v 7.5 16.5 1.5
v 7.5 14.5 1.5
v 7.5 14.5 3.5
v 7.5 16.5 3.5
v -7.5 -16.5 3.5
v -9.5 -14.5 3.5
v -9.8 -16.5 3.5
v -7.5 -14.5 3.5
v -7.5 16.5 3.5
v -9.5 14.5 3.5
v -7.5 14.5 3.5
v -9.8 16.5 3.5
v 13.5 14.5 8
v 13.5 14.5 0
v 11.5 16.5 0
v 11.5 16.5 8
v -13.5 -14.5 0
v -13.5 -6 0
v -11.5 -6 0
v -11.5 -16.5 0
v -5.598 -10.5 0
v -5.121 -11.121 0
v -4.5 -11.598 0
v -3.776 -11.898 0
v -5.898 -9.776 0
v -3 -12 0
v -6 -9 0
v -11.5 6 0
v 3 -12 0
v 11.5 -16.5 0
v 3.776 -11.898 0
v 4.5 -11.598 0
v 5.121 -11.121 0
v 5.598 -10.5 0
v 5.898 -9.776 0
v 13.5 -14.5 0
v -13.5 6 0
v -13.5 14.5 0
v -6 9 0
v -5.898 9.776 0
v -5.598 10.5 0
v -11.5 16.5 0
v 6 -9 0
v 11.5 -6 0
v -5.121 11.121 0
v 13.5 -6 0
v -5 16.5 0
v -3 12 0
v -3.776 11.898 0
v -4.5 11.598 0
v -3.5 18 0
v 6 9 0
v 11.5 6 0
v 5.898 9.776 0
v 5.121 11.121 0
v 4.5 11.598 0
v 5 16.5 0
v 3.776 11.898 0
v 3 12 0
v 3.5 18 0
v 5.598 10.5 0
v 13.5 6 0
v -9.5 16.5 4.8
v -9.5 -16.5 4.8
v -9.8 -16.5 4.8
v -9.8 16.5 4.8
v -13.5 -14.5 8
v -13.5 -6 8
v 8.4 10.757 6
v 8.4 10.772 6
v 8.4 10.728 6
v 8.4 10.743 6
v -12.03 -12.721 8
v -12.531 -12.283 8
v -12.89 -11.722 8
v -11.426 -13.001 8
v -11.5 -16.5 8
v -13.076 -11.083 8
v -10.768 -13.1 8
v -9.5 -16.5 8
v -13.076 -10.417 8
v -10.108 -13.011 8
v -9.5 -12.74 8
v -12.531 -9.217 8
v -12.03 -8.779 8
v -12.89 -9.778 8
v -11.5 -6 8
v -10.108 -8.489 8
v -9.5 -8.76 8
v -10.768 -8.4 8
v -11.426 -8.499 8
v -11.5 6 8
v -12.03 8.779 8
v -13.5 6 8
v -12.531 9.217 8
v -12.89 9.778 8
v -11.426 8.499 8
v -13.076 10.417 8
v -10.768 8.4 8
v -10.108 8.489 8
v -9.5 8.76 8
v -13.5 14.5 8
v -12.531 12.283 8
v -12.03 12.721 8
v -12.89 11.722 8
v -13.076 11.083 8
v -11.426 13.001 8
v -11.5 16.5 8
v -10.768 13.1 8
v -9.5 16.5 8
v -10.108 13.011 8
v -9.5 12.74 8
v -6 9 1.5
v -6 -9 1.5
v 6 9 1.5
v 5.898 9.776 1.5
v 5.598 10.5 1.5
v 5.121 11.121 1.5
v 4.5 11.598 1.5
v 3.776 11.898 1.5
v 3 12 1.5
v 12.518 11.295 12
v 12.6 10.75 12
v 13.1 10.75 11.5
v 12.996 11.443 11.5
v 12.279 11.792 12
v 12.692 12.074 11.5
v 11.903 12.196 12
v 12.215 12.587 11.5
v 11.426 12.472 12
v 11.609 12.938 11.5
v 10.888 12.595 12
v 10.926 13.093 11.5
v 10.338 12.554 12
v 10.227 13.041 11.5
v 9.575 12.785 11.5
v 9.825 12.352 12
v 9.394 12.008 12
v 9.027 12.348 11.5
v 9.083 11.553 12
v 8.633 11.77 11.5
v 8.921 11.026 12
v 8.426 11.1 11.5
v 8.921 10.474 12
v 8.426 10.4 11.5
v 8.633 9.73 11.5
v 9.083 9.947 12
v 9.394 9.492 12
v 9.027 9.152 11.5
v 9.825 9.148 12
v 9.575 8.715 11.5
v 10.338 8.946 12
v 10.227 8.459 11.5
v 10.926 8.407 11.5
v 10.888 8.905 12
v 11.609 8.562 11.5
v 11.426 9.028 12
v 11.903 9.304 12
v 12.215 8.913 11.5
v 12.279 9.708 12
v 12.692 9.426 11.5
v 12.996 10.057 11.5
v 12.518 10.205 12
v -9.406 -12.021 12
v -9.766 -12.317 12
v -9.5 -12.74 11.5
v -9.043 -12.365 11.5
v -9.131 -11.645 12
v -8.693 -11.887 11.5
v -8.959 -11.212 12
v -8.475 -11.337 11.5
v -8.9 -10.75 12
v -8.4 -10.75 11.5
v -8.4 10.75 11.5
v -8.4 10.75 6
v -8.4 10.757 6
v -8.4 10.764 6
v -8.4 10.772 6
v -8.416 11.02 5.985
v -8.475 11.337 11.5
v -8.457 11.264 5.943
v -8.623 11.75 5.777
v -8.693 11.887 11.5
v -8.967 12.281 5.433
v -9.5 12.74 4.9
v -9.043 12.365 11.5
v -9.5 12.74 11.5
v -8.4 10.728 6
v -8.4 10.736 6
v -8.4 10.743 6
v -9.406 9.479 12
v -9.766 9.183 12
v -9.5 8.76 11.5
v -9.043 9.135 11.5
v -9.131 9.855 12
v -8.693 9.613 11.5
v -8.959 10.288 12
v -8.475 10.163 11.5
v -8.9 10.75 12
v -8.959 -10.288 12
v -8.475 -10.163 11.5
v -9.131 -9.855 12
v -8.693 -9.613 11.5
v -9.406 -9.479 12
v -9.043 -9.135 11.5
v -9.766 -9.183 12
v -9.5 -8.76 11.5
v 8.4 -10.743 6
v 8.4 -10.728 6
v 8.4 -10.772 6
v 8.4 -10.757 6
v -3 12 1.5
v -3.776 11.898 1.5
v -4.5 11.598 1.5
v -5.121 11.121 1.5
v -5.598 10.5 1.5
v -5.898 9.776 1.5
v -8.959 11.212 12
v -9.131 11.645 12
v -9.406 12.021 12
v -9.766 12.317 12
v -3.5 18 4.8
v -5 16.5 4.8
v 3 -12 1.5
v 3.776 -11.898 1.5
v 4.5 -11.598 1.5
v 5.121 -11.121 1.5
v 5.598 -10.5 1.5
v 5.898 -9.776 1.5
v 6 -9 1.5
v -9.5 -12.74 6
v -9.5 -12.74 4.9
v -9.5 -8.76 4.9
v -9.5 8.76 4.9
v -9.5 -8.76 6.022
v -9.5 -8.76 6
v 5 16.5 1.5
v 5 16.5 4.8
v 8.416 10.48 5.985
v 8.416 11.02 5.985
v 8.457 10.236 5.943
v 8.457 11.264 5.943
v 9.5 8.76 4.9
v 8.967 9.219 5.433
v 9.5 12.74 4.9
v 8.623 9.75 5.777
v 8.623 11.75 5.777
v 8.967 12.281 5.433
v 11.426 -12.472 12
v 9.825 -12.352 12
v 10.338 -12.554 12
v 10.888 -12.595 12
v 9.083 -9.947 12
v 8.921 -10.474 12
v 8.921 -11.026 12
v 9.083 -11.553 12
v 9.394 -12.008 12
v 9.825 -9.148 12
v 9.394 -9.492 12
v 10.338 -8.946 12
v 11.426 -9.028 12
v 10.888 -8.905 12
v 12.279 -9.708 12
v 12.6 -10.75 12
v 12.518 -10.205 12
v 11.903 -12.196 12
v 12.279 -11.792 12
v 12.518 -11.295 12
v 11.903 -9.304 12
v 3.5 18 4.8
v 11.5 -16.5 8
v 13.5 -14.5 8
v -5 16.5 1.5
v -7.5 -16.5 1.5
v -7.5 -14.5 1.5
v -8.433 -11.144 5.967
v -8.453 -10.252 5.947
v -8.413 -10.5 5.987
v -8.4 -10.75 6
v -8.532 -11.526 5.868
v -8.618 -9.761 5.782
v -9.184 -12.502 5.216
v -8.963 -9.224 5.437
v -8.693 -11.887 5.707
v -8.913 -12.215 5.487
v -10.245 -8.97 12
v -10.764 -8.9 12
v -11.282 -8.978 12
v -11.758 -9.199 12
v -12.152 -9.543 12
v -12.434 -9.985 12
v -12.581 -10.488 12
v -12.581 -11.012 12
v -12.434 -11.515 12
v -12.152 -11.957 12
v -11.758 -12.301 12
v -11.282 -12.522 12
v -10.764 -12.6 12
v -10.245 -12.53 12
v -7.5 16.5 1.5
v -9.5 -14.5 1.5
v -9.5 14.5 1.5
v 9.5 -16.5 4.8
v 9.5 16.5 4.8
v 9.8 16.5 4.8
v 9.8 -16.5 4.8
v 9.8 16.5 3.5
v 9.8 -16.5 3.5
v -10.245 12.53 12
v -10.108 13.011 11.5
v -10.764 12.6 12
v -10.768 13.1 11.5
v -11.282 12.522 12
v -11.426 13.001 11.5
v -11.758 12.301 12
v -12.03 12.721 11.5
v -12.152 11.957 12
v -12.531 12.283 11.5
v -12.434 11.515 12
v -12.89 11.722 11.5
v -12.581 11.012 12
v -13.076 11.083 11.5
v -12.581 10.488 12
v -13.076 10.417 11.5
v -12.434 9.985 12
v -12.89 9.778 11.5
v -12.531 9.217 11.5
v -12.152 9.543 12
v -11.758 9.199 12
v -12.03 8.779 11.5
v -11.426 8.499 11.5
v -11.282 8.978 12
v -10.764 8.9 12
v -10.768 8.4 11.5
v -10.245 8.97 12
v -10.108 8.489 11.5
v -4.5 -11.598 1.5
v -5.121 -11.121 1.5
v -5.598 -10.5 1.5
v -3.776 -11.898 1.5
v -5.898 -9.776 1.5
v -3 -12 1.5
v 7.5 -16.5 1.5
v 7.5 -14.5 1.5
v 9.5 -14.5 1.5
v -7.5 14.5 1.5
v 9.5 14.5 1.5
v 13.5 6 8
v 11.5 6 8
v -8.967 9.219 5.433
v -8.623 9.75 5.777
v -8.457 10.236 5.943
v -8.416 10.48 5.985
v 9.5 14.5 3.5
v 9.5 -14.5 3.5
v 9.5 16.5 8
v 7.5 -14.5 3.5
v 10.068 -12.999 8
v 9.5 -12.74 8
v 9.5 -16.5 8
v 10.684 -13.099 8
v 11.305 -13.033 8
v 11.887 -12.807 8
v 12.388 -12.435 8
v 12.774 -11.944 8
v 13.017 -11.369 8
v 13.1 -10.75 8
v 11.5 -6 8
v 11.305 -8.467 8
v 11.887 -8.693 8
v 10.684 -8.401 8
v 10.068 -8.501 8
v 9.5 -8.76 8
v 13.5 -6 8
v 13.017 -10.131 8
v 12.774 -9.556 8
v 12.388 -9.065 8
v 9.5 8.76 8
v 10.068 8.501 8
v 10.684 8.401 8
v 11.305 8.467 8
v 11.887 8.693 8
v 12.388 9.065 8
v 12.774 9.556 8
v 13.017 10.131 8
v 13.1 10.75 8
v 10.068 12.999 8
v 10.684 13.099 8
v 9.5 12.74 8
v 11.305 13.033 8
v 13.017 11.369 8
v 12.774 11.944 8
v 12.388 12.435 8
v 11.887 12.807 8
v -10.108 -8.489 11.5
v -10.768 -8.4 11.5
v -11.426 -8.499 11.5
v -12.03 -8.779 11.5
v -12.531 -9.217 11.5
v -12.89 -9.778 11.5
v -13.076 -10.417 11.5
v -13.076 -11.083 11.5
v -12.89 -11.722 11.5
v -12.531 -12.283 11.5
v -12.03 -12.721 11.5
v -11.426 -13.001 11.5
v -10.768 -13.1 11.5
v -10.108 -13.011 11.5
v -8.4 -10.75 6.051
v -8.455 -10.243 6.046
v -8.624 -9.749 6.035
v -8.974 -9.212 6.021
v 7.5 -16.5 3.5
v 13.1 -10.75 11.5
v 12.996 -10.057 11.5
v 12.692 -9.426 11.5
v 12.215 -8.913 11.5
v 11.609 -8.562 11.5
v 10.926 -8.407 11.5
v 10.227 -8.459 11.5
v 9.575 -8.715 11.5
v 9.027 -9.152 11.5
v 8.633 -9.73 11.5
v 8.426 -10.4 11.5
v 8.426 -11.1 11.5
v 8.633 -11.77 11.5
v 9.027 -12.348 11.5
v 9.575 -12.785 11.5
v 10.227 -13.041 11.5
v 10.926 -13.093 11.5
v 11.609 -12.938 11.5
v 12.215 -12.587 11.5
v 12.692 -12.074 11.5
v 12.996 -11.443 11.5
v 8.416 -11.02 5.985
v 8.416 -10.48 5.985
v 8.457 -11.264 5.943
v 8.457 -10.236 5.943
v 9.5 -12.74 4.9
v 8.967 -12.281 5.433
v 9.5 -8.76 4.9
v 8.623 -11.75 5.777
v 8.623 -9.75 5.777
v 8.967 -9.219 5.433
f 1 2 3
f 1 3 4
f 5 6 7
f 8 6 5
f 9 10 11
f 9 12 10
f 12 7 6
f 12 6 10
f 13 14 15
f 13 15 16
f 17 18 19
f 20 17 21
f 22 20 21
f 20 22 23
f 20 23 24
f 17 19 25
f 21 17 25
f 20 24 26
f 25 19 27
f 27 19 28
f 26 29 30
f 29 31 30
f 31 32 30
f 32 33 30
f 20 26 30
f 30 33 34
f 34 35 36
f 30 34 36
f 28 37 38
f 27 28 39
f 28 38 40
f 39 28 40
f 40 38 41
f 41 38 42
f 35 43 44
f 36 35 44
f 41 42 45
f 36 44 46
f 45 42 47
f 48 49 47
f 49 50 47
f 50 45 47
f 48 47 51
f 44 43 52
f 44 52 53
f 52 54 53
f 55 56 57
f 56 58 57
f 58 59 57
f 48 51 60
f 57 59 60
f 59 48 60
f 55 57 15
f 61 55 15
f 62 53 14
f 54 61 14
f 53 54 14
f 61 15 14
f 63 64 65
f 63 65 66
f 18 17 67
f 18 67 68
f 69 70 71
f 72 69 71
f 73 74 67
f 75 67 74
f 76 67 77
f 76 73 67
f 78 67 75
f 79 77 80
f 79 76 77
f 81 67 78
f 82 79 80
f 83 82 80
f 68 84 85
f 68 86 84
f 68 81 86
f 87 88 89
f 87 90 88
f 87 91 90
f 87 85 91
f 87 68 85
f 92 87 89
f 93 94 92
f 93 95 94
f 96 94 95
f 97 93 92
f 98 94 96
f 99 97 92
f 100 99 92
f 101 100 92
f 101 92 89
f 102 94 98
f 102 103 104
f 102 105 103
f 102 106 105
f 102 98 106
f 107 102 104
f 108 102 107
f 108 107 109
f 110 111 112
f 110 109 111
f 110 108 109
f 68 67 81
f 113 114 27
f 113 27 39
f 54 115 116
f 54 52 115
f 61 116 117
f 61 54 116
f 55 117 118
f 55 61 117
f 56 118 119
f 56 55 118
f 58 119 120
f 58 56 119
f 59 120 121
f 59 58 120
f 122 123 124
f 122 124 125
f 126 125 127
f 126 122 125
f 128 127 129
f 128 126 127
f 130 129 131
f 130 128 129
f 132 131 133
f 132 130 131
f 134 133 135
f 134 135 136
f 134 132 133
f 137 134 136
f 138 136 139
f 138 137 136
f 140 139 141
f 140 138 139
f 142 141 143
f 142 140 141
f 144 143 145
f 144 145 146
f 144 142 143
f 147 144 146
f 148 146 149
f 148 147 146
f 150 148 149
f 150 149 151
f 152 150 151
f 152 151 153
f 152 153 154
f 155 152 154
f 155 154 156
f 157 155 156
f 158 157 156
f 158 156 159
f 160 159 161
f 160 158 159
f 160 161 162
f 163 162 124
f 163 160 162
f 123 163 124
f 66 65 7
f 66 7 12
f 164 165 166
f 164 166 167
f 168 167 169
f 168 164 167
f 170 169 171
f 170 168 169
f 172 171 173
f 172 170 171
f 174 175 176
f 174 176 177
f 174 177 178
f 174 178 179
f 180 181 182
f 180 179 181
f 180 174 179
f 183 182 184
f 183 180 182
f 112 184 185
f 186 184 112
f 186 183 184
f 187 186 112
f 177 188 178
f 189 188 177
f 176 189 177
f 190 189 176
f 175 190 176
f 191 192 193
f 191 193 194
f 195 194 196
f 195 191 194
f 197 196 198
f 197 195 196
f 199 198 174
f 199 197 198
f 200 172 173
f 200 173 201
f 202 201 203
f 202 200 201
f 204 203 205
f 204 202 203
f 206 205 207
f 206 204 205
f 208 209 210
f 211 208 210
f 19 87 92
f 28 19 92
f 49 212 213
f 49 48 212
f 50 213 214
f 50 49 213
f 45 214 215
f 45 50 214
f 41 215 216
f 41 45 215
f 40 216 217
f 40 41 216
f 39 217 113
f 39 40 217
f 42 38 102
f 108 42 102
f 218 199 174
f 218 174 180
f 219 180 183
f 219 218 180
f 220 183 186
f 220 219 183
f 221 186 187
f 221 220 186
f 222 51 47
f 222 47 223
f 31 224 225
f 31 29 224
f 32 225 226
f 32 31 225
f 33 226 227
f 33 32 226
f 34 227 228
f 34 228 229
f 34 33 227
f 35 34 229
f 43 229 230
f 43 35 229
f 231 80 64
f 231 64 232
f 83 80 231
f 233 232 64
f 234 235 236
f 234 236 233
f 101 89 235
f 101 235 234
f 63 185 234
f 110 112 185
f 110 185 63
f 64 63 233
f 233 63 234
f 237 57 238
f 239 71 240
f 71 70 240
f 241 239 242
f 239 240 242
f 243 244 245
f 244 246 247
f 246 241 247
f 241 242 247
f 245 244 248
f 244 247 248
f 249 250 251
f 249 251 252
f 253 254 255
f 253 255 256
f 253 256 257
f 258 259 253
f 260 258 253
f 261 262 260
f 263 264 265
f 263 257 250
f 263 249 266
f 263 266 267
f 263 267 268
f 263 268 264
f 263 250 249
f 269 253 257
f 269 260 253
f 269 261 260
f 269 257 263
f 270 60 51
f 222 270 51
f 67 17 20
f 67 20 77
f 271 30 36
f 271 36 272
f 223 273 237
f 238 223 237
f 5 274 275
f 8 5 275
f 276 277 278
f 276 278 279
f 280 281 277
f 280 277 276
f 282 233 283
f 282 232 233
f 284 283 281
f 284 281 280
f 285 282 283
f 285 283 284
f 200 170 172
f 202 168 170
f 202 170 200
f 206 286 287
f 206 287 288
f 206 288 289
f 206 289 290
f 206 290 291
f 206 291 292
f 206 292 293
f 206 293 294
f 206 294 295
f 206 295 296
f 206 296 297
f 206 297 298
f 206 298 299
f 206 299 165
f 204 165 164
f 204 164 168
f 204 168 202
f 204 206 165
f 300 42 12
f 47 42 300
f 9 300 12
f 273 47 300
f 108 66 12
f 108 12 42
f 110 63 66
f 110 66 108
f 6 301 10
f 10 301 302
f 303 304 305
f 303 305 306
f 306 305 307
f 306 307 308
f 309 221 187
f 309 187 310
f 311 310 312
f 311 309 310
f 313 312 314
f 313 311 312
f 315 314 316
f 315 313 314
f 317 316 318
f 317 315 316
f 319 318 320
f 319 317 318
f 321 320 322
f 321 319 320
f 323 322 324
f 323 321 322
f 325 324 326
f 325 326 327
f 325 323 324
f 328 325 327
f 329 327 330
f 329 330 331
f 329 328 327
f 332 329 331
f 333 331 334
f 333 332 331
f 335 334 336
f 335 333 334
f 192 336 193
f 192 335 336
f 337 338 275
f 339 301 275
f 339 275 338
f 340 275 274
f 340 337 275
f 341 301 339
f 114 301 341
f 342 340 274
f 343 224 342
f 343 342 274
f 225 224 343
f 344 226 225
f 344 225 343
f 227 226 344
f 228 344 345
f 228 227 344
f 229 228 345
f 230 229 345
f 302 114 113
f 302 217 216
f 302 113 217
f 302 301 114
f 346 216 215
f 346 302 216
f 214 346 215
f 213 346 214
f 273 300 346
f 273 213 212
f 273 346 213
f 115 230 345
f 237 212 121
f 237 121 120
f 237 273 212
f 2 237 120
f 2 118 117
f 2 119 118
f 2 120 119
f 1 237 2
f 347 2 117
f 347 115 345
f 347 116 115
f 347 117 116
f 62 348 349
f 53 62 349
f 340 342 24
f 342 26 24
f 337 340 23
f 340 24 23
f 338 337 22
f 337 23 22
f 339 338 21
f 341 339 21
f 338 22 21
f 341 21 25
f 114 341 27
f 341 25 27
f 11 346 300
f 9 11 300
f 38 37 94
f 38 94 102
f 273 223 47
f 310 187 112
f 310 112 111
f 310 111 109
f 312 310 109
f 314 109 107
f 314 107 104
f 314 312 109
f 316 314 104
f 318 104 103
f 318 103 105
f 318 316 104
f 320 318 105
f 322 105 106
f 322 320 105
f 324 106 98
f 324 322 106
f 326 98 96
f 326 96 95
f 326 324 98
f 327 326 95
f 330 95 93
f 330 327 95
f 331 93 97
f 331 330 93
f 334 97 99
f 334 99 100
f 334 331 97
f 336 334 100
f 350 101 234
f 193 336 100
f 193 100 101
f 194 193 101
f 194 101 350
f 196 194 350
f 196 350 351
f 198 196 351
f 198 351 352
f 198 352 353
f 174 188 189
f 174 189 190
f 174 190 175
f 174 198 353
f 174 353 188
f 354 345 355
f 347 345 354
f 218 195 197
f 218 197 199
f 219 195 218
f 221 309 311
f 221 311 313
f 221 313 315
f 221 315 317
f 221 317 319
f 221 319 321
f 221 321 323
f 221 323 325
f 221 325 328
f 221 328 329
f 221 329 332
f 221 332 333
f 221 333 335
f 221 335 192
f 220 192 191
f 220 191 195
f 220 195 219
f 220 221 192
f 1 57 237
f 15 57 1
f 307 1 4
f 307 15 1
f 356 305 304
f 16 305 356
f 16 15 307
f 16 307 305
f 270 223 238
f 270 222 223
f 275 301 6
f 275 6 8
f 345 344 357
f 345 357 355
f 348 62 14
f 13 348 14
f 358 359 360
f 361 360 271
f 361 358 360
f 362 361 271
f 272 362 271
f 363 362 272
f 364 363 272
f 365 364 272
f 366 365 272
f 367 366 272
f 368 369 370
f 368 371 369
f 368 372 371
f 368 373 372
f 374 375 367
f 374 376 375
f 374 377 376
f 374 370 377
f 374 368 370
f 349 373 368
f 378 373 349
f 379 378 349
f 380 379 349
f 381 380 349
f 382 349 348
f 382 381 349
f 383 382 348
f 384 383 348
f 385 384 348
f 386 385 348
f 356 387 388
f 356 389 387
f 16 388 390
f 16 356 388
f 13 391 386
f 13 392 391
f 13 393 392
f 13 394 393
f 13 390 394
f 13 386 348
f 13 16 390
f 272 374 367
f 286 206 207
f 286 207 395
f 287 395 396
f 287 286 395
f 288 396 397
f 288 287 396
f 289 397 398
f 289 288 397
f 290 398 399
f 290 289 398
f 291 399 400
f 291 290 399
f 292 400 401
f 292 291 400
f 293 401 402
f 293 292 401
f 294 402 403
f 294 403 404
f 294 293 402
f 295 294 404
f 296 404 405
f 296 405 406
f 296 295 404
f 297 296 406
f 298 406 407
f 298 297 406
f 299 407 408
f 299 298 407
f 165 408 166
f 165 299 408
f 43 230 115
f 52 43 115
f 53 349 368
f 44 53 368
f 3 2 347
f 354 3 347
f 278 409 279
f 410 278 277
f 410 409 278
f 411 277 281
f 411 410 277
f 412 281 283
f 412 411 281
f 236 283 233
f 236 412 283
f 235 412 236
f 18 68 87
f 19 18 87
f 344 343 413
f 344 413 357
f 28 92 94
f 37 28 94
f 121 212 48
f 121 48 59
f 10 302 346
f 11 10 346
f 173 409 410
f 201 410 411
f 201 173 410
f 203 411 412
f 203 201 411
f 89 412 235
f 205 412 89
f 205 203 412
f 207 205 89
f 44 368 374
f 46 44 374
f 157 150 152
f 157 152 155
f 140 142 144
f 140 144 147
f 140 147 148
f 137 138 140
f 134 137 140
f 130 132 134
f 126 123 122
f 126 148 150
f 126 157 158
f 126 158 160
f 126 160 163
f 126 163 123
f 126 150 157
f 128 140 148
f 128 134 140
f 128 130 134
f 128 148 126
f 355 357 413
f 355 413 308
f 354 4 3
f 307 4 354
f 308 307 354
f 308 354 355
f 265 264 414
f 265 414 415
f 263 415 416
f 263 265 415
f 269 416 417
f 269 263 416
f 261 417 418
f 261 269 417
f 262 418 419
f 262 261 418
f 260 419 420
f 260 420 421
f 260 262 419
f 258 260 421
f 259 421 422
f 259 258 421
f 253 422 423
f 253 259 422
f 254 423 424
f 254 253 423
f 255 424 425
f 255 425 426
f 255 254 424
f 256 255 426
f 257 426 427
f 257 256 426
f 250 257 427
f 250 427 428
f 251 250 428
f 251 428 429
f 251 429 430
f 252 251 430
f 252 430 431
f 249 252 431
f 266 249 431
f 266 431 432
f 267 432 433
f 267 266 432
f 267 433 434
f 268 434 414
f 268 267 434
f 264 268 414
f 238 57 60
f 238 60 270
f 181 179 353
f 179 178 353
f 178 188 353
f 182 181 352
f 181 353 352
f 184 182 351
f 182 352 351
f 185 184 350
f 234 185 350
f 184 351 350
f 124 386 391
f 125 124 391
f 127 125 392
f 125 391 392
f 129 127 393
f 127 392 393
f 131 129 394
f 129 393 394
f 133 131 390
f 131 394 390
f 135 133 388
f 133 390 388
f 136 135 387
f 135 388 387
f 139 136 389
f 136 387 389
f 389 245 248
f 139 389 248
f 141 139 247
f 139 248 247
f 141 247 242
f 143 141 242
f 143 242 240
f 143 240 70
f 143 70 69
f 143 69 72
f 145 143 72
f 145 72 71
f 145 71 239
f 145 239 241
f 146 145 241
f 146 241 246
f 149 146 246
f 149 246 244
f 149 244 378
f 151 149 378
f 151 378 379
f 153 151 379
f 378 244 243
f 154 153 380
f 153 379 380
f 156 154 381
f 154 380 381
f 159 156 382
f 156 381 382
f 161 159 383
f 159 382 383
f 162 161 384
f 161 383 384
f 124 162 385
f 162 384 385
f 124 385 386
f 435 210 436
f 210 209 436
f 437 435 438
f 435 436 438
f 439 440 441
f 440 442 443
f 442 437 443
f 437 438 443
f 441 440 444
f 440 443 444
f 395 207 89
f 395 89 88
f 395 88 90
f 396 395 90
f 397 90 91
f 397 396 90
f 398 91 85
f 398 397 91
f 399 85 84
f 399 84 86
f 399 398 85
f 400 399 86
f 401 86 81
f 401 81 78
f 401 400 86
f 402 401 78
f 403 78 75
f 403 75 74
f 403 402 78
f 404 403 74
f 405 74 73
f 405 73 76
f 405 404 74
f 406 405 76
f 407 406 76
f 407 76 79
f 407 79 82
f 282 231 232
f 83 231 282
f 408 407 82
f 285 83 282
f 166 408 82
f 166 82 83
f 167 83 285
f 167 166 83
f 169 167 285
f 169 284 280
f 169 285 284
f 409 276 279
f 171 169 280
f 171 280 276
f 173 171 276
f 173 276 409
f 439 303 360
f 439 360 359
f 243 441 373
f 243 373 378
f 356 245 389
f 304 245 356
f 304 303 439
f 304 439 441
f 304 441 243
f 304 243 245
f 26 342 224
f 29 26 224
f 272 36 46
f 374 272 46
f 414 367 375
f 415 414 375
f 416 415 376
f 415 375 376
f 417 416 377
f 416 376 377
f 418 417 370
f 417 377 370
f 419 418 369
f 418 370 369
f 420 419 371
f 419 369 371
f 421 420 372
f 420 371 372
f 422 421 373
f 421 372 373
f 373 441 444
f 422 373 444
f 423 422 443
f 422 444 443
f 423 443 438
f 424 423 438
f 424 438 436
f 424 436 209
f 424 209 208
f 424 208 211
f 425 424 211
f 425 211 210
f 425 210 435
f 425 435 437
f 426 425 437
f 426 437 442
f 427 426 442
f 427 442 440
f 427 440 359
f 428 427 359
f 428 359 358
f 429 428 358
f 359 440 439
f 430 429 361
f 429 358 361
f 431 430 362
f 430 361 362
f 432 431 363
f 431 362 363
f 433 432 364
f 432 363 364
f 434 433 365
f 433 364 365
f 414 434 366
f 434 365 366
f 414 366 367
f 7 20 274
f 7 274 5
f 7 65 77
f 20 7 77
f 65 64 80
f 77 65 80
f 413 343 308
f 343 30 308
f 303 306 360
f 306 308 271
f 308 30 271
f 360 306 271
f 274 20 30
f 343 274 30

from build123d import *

# Parameters (mm, degrees)
F1_DEPTH       = 1.5
F0_W           = 4
F0_H           = 33
F2_DEPTH       = 8
F3_W           = 33
F3_H           = 1.5
F4_DEPTH       = 0.5
F5_W           = 33
F5_H           = 1.5
F6_DEPTH       = 0.5
F7_W           = 2
F7_H           = 2
F8_DEPTH       = 2
F10_W          = 12
F10_H          = 24
F11_DEPTH      = 1.5
F13_DEPTH      = 25
F14_R          = 3
F9_R           = 2.35
F15_DEPTH      = 4
F16_DEPTH      = 2
F17_DEPTH      = 4
F17_DEPTH_BACK = 2
F18_DEPTH      = 0.2
F19_DEPTH      = 0.2
F20_DEPTH      = 0.2
F21_SIZE       = 0.5
F22_C1_SIZE    = 1.0999
F22_C2_SIZE    = 1.0999
F22_C3_SIZE    = 1.0999
F22_T7_DEPTH   = 9.637652322
F22_S8_R       = 2.35
F22_T9_DEPTH   = 6
F23_DEPTH      = 4.8
F24_SIZE       = 1.49999
F25_SIZE       = 2


# Not quite as in the source:
# - a fillet or chamfer that OpenCascade refuses, or shapes differently, is made with other operations: its cross-section is extruded or revolved along the edge and cut away or added
# - a fillet or chamfer is up to 0.001 mm smaller than in the source, because OpenCascade refuses the exact size


with BuildPart() as f1:
    # F0 (on Top) → F1 (new body)
    with BuildSketch(Plane.XY):
        Polygon((9.5, -16.5), (9.5, 16.5), (5, 16.5), (-5, 16.5), (-9.5, 16.5), (-9.5, -16.5), align=None)
    extrude(amount=F1_DEPTH)

    # F0 (on Top) → F2 (join)
    with BuildSketch(Plane.XY):
        with Locations((-11.5, 0)):
            Rectangle(F0_W, F0_H)
        with Locations((11.5, 0)):
            Rectangle(F0_W, F0_H)
    extrude(amount=F2_DEPTH)

    # F3 (on face) → F4 (cut)
    with BuildSketch(Plane.YZ.offset(-9.5)):
        with Locations((0, 4.25)):
            Rectangle(F3_W, F3_H)
    extrude(amount=-F4_DEPTH, mode=Mode.SUBTRACT)

    # F5 (on face) → F6 (cut)
    with BuildSketch(Plane(origin=(9.5, 0, 0), x_dir=(0, -1, 0), z_dir=(-1, 0, 0))):
        with Locations((0, 4.25)):
            Rectangle(F5_W, F5_H)
    extrude(amount=-F6_DEPTH, mode=Mode.SUBTRACT)

    # F7 (on face) → F8 (join)
    with BuildSketch(Plane.XY.offset(1.5)):
        with Locations((-8.5, 15.5)):
            Rectangle(F7_W, F7_H)
        with Locations((8.5, 15.5)):
            Rectangle(F7_W, F7_H)
        with Locations((8.5, -15.5)):
            Rectangle(F7_W, F7_H)
        with Locations((-8.5, -15.5)):
            Rectangle(F7_W, F7_H)
    extrude(amount=F8_DEPTH)

    # F10 (on face) → F11 (cut)
    with BuildSketch(Plane.XY.offset(1.5)):
        Rectangle(F10_W, F10_H)
    extrude(amount=-F11_DEPTH, mode=Mode.SUBTRACT)

    # F12 (on face) → F13 (cut)
    with BuildSketch(Plane.XY.offset(8)):
        Polygon((13.5, -6), (13.5, 6), (11.5, 6), (11.5, 0), (11.5, -6), align=None)
        Polygon((-11.5, 6), (-13.5, 6), (-13.5, -6), (-11.5, -6), (-11.5, 0), align=None)
    extrude(amount=-F13_DEPTH, mode=Mode.SUBTRACT)

    # F14
    f14_edges = [f1.edges().sort_by_distance(p)[0] for p in [
        (6, 12, 0.75),
        (-6, 12, 0.75),
        (-6, -12, 0.75),
        (6, -12, 0.75),
    ]]
    fillet(f14_edges, radius=F14_R)

    # F9 (on face) → F15 (join)
    with BuildSketch(Plane.XY.offset(8)):
        with BuildLine():
            Line((-9.5, 8.7600251258), (-9.5, 12.7399748742))
            ThreePointArc((-9.5, 12.7399748742), (-13.1, 10.75), (-9.5, 8.7600251258))
        make_face()
        with Locations((10.75, 10.75)):
            Circle(F9_R)
        with BuildLine():
            ThreePointArc((-8.4, -10.75), (-8.6933036199, -9.6131182999), (-9.5, -8.7600251258))
            Line((-9.5, -8.7600251258), (-9.5, -12.7399748742))
            ThreePointArc((-9.5, -12.7399748742), (-8.6933036199, -11.8868817001), (-8.4, -10.75))
        make_face()
        with Locations((10.75, -10.75)):
            Circle(F9_R)
    extrude(amount=F15_DEPTH)

    # F16 (add): faces of the model
    f16_faces = [f1.faces().sort_by_distance(p)[0] for p in [
        (9.0497739869, -10.75, 8),
        (9.0497739869, 10.75, 8),
    ]]
    extrude(f16_faces, amount=F16_DEPTH)

    # F9 (on face) → F17 (join, two sides)
    with BuildSketch(Plane.XY.offset(8)) as f17_sk:
        with BuildLine():
            ThreePointArc((-9.5, 8.7600251258), (-8.6933036199, 9.6131182999), (-8.4, 10.75))
            ThreePointArc((-8.4, 10.75), (-8.6933036199, 11.8868817001), (-9.5, 12.7399748742))
            Line((-9.5, 12.7399748742), (-9.5, 8.7600251258))
        make_face()
        with BuildLine():
            Line((-9.5, -12.7399748742), (-9.5, -8.7600251258))
            ThreePointArc((-9.5, -8.7600251258), (-13.1, -10.75), (-9.5, -12.7399748742))
        make_face()
        with BuildLine():
            ThreePointArc((-8.4, -10.75), (-8.6933036199, -9.6131182999), (-9.5, -8.7600251258))
            Line((-9.5, -8.7600251258), (-9.5, -12.7399748742))
            ThreePointArc((-9.5, -12.7399748742), (-8.6933036199, -11.8868817001), (-8.4, -10.75))
        make_face()
    extrude(amount=F17_DEPTH)
    extrude(f17_sk.sketch, amount=-F17_DEPTH_BACK)

    # F18 (add): faces of the model
    f18_faces = [f1.faces().sort_by_distance(p)[0] for p in [
        (-9.75, 0, 5),
        (9.75, 0, 5),
    ]]
    extrude(f18_faces, amount=F18_DEPTH)

    # F19 (add): a face of the model
    f19_faces = [f1.faces().sort_by_distance(p)[0] for p in [
        (-10, 0, 4.15),
    ]]
    extrude(f19_faces, amount=F19_DEPTH)

    # F20 (add): a face of the model
    f20_faces = [f1.faces().sort_by_distance(p)[0] for p in [
        (10, 0, 4.15),
    ]]
    extrude(f20_faces, amount=F20_DEPTH)

    # F21
    f21_edges = [f1.edges().sort_by_distance(p)[0] for p in [
        (8.4, 10.75, 12),
        (8.4, -10.75, 12),
        (-13.1, -10.75, 12),
        (-13.1, 10.75, 12),
        (-8.4, 10.75, 12),
        (-8.4, -10.75, 12),
    ]]
    chamfer(f21_edges, length=F21_SIZE)

    # F22: chamfer of 1.1 on 4 edges, made by hand

    # F22_c1 (size 1.1 in the source; OpenCascade refuses exactly that, so slightly less here)
    f22_c1_edges = [f1.edges().sort_by_distance(p)[0] for p in [
        (9.5, 10.75, 6),
    ]]
    chamfer(f22_c1_edges, length=F22_C1_SIZE)

    # F22_c2 (size 1.1 in the source; OpenCascade refuses exactly that, so slightly less here)
    f22_c2_edges = [f1.edges().sort_by_distance(p)[0] for p in [
        (9.5, -10.75, 6),
    ]]
    chamfer(f22_c2_edges, length=F22_C2_SIZE)

    # F22_c3 (size 1.1 in the source; OpenCascade refuses exactly that, so slightly less here)
    f22_c3_edges = [f1.edges().sort_by_distance(p)[0] for p in [
        (-9.5, 10.75, 6),
    ]]
    chamfer(f22_c3_edges, length=F22_C3_SIZE)


with BuildPart() as f22_tool5:
    # F22_s6 → F22_t7 (new body)
    with BuildSketch(Plane.XZ.offset(15.568826161)):
        with BuildLine():
            Line((-9.5311126984, 4.8688873016), (-8.3688873016, 6.0311126984))
            Line((-8.3688873016, 6.0311126984), (-8.3688873016, 6.0531126984))
            ThreePointArc((-8.3688873016, 6.0531126984), (-8.9344436508, 6.022), (-9.5, 6.022))
            Line((-9.5, 6.022), (-9.522, 6))
            ThreePointArc((-9.522, 6), (-9.522, 5.4344436508), (-9.5531126984, 4.8688873016))
            Line((-9.5531126984, 4.8688873016), (-9.5311126984, 4.8688873016))
        make_face()
    extrude(amount=-F22_T7_DEPTH)

    # F22_s8 → F22_t9 (intersect, symmetric)
    with BuildSketch(Plane.XY.offset(5.5)):
        with Locations((-10.75, -10.75)):
            Circle(F22_S8_R)
    extrude(amount=F22_T9_DEPTH, both=True, mode=Mode.INTERSECT)


with BuildPart() as f1_1:
    add(f1.part)

    # F22_t4: union F22_tool5
    add(f22_tool5.part)

    # F0 (on Top) → F23 (join, through all)
    with BuildSketch(Plane.XY):
        Polygon((-5, 16.5), (5, 16.5), (5, 18), (0, 18), (-5, 18), align=None)
    extrude(amount=F23_DEPTH)

    # F24 (size 1.5 in the source; OpenCascade refuses exactly that, so slightly less here)
    f24_edges = [f1_1.edges().sort_by_distance(p)[0] for p in [
        (-5, 18, 2.4),
        (5, 18, 2.4),
    ]]
    chamfer(f24_edges, length=F24_SIZE)

    # F25
    f25_edges = [f1_1.edges().sort_by_distance(p)[0] for p in [
        (13.5, -16.5, 4),
        (-13.5, -16.5, 4),
        (13.5, 16.5, 4),
        (-13.5, 16.5, 4),
    ]]
    chamfer(f25_edges, length=F25_SIZE)


solid = f1_1.part
